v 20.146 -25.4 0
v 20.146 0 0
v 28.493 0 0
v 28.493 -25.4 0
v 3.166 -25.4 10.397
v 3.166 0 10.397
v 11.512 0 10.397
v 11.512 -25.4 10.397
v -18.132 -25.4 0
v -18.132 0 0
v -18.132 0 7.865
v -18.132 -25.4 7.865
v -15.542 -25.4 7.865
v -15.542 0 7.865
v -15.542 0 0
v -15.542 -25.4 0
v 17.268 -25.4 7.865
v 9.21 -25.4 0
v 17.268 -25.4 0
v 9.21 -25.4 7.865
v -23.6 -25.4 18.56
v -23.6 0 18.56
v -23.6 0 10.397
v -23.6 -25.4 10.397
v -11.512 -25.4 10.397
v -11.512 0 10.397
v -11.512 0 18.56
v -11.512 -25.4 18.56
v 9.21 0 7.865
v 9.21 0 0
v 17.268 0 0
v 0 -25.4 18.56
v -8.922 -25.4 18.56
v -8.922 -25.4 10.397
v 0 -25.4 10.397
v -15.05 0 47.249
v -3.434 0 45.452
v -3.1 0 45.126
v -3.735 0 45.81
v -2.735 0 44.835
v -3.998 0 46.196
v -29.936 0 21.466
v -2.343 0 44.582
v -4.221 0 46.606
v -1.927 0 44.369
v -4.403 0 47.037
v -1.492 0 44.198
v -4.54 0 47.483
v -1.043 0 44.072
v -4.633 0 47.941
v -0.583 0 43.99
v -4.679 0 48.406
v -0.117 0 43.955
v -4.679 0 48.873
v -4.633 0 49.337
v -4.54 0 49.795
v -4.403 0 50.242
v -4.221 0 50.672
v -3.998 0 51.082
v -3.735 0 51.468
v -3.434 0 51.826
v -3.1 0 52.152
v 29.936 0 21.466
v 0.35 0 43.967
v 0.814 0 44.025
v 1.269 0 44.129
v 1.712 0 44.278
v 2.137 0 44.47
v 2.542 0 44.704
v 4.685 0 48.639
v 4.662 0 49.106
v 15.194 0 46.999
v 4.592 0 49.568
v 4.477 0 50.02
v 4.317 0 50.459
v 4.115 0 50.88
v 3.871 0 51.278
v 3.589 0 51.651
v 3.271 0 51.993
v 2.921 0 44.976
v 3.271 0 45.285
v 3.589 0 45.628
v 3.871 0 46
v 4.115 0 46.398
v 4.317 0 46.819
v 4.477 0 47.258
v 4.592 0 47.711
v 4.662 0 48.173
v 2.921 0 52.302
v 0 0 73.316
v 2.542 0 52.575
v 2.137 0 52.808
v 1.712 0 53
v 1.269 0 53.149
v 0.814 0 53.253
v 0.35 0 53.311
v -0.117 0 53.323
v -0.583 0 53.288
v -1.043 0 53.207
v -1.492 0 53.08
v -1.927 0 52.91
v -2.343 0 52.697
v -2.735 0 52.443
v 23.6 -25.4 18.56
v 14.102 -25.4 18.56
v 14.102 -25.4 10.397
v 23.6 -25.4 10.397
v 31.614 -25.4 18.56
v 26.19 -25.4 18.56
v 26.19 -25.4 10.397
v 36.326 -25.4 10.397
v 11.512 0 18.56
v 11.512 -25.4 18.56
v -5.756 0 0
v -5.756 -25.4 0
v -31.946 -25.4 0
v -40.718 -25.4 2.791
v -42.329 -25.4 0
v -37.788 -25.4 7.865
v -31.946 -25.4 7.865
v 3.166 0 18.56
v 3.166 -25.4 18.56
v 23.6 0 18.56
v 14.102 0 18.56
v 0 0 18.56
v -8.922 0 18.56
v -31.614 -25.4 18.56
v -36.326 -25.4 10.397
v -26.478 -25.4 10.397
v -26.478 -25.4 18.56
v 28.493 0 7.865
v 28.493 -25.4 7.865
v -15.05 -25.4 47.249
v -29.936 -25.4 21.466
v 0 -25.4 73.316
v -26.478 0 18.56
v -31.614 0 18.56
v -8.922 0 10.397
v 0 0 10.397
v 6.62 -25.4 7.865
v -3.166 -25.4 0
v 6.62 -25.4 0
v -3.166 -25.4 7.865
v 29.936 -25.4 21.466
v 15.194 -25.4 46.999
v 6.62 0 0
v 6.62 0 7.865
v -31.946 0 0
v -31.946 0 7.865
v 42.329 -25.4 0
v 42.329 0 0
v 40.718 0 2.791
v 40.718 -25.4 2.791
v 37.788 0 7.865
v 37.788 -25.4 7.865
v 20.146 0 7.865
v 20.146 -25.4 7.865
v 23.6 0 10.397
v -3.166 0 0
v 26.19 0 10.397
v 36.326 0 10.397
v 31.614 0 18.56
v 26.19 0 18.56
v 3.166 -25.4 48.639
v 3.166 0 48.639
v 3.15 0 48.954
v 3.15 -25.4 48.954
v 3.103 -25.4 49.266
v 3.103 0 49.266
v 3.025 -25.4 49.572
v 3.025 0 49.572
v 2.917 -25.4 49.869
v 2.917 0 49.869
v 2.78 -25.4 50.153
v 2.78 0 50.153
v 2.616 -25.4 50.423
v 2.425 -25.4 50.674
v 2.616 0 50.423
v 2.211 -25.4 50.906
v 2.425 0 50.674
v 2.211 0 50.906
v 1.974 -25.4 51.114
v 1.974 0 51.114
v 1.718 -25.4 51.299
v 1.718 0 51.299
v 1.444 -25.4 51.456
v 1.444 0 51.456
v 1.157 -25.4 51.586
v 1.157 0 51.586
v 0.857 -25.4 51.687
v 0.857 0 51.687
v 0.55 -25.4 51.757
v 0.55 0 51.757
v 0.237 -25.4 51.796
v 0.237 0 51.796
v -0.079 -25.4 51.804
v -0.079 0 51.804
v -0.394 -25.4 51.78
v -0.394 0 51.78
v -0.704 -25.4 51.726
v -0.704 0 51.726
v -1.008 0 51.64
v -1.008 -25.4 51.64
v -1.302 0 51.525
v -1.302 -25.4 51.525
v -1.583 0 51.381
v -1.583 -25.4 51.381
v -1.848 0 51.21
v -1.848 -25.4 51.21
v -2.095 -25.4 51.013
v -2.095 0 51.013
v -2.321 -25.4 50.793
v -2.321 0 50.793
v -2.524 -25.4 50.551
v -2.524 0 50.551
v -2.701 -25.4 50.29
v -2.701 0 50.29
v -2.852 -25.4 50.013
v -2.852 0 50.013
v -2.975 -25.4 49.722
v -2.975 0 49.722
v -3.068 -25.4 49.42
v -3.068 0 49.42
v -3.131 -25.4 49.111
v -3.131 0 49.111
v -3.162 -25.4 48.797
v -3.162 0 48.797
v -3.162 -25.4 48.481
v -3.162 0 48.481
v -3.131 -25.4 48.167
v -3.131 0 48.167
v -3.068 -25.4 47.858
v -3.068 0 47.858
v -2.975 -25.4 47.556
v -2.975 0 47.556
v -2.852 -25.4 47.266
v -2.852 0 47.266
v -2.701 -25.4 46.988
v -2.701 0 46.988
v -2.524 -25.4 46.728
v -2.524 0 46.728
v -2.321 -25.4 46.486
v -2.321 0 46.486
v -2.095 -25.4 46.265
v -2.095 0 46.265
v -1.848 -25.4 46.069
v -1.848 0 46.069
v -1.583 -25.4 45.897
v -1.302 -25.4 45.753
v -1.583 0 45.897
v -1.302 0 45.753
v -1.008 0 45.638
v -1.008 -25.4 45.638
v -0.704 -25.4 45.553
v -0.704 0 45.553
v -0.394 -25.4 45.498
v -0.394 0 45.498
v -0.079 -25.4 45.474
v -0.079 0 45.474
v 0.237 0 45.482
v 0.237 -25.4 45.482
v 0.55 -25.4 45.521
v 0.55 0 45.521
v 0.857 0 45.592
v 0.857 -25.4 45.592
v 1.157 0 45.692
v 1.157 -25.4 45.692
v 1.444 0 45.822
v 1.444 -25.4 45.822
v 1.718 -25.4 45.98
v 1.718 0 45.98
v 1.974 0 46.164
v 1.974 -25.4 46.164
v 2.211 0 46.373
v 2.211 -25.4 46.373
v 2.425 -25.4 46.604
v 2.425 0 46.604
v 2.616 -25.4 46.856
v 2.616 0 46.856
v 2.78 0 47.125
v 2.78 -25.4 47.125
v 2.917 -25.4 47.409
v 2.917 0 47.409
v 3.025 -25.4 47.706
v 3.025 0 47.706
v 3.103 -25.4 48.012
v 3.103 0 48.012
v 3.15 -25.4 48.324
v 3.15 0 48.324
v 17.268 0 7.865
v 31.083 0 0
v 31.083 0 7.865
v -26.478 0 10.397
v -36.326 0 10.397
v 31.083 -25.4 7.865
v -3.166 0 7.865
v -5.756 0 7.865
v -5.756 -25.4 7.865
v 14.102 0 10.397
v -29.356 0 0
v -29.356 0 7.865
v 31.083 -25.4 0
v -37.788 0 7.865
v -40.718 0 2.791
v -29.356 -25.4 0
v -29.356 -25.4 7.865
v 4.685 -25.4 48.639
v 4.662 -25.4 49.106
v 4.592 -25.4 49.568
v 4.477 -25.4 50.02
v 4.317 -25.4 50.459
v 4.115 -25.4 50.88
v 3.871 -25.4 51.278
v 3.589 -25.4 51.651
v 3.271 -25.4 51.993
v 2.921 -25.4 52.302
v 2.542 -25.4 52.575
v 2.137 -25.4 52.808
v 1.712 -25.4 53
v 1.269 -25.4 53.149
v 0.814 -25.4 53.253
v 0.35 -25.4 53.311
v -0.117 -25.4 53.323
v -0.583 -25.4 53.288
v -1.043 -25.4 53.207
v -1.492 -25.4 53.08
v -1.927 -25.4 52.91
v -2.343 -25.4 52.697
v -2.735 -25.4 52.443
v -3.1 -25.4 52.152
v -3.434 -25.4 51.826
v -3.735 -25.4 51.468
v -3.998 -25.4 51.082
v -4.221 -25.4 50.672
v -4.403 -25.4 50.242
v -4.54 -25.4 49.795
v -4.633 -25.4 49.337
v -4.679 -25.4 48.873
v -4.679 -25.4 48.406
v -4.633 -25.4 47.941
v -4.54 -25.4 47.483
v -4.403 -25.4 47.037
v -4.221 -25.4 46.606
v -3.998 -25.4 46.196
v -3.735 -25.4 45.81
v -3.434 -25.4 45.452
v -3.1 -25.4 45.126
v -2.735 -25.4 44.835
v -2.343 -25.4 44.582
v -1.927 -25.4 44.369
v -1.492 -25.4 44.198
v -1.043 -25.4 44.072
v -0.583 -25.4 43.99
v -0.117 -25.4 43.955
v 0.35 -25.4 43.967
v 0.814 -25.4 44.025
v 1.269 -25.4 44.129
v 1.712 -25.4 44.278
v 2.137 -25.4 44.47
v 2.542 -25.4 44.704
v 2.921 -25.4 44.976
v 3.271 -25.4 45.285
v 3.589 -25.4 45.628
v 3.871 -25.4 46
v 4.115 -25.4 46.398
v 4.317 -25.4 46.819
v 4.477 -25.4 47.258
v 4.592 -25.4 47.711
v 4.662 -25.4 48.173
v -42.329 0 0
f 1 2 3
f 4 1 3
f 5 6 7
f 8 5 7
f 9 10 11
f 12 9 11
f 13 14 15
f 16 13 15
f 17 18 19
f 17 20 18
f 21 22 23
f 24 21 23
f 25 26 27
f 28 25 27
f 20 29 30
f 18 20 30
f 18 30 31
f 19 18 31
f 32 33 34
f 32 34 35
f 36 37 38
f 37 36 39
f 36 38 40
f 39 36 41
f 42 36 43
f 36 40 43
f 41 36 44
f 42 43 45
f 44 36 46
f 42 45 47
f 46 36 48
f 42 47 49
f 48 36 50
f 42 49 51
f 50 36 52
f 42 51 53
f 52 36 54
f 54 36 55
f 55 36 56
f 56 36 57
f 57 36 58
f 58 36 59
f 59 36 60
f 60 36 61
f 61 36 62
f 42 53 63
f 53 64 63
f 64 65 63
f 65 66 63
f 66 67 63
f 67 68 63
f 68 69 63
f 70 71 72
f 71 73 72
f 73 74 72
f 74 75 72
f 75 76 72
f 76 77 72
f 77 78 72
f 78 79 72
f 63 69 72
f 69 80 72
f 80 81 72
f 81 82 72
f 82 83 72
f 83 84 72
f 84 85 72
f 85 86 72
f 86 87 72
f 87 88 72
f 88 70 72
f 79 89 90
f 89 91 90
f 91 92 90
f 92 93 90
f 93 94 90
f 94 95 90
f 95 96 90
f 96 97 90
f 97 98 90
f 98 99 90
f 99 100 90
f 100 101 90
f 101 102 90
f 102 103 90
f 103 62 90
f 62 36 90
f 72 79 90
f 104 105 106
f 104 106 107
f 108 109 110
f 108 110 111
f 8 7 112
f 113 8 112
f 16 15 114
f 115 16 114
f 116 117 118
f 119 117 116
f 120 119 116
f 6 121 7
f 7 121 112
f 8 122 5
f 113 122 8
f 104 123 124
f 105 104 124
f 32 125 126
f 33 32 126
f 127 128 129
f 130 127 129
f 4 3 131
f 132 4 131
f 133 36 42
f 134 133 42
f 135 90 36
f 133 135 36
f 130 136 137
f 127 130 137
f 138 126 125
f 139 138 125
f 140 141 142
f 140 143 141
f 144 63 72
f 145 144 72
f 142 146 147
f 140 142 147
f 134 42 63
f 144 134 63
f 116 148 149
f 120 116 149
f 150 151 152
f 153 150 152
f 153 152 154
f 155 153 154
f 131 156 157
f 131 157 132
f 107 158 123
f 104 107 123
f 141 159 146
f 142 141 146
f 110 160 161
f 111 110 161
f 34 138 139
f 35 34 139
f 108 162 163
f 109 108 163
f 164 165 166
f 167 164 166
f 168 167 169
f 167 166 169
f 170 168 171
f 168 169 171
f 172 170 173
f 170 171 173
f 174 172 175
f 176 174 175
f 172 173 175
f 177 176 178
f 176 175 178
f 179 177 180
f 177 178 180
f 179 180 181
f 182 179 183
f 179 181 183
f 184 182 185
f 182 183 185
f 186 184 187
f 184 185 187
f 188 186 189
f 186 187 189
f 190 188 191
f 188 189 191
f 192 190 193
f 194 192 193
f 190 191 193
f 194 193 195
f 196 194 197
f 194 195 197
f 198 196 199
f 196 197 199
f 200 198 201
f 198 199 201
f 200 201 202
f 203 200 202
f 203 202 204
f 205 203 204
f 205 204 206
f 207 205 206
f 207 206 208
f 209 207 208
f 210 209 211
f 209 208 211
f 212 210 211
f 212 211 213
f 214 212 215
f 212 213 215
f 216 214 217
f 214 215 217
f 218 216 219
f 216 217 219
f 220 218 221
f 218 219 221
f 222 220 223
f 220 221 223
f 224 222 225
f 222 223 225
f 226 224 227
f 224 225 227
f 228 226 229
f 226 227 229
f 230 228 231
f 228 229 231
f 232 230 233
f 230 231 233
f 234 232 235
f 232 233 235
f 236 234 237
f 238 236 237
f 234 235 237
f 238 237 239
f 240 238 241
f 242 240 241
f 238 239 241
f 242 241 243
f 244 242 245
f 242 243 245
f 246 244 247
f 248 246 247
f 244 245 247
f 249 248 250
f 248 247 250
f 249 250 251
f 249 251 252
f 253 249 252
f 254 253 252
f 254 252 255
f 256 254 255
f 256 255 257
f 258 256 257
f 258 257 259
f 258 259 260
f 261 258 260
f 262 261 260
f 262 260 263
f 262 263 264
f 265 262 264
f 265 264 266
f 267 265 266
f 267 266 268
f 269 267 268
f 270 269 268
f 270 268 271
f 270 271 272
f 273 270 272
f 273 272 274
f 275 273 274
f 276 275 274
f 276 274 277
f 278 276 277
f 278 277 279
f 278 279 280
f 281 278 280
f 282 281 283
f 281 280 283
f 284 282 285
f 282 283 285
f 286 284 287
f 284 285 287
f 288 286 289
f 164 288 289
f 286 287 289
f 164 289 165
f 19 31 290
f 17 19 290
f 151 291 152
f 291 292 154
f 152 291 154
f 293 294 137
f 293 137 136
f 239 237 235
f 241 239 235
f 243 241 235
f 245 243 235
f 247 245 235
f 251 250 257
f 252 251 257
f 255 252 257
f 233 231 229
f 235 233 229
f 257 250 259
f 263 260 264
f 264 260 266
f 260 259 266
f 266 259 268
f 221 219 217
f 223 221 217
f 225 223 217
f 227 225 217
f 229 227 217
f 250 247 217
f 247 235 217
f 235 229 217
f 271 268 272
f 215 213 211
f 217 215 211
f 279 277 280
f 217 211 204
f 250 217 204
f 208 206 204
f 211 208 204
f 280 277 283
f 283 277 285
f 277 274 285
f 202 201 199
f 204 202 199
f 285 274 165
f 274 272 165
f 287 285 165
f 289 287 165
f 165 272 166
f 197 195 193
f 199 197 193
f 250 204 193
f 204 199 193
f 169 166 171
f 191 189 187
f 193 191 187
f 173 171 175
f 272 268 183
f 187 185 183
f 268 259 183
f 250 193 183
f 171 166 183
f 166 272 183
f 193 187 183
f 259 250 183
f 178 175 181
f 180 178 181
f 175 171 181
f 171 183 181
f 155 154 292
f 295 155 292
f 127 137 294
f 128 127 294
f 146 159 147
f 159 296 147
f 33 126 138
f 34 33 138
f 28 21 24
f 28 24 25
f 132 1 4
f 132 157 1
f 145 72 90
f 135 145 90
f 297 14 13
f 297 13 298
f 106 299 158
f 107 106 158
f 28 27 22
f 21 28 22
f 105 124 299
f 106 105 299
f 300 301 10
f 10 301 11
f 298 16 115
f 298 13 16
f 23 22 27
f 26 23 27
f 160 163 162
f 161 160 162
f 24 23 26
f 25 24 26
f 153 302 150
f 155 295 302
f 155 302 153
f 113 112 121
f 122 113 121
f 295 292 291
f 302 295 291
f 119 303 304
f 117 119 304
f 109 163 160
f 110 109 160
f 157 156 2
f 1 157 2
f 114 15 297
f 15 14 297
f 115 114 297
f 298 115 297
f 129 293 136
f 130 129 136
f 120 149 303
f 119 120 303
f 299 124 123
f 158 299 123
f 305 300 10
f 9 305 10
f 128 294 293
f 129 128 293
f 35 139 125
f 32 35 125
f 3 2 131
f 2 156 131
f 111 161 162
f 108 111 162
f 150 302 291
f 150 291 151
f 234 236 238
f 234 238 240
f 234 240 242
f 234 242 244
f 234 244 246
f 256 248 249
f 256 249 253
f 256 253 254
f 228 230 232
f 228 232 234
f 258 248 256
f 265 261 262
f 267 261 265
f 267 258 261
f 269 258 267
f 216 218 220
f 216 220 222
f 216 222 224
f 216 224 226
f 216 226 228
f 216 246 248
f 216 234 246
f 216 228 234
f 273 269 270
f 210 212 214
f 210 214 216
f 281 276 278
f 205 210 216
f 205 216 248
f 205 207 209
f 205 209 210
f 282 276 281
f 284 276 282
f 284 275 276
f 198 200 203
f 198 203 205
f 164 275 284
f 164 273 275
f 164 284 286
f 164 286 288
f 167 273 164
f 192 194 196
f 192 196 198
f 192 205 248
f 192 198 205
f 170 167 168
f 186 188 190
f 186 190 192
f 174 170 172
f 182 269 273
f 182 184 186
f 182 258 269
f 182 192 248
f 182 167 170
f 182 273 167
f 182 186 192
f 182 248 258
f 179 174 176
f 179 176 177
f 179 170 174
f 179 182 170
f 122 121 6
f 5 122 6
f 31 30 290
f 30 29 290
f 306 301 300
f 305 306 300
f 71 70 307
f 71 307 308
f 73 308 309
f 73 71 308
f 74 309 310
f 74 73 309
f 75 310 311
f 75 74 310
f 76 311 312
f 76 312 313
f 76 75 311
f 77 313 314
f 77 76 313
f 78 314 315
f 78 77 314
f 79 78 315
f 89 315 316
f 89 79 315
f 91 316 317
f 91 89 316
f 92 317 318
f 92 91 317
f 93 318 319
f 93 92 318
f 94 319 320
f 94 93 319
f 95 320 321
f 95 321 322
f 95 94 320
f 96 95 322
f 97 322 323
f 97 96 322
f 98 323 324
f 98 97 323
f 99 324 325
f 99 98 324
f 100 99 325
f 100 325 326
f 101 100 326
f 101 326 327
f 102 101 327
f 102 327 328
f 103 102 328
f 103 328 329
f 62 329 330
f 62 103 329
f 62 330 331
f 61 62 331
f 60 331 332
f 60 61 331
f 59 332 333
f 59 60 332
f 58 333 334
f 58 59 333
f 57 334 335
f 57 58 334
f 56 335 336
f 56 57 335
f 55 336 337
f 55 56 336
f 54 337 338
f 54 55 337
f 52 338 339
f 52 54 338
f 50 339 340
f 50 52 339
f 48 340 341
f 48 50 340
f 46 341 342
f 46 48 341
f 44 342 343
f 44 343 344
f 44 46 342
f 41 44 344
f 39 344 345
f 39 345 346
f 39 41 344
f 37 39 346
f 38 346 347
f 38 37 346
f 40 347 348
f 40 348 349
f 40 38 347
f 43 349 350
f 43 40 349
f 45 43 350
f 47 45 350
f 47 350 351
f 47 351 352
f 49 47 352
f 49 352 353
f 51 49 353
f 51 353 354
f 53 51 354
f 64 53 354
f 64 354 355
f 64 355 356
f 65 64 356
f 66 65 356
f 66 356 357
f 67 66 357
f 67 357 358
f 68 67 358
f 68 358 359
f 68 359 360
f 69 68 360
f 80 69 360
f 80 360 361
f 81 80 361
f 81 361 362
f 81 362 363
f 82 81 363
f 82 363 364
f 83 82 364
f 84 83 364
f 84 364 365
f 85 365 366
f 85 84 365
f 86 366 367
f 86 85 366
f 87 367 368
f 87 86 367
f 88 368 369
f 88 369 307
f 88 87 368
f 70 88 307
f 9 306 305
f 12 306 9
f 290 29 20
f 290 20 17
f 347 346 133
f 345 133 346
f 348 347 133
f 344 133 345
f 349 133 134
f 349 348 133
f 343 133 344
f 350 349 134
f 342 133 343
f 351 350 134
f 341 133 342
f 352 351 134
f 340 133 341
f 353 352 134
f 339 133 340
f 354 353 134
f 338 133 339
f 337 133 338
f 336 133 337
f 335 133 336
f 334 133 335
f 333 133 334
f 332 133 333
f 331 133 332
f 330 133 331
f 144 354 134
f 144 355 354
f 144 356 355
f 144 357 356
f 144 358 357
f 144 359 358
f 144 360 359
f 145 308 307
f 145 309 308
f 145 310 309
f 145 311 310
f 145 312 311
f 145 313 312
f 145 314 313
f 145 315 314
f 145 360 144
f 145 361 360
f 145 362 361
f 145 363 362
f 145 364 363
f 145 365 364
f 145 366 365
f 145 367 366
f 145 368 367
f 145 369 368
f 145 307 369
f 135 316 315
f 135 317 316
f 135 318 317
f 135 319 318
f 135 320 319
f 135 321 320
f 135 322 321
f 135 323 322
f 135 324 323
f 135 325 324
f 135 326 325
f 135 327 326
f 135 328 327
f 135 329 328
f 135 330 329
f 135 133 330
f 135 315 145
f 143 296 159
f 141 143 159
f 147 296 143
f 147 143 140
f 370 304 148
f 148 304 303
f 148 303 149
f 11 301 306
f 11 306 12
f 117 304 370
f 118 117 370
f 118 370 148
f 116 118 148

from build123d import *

# Parameters (mm, degrees)
F0_R     = 4.6851378816
F1_DEPTH = 25.4
F0_W     = 11.2244244665
F0_H     = 2.7910378677
F0_H_2   = 5.0737742207
F0_W_2   = 9.7853969783
F0_W_3   = 9.7853962798
F0_W_4   = 8.0585628748
F0_W_5   = 8.3463639021
F0_R_2   = 3.1658646185


with BuildPart() as f1:
    # F0 (on Front) → F1 (new body)
    with BuildSketch(Plane.XZ):
        with BuildLine():
            Line((15.1939415336, 46.9994731352), (0, 73.3161518387))
            Line((0, 73.3161518387), (-15.0500384588, 47.2487205721))
            add(Edge.make_bspline(
                [(15.1939415336, 46.9994731352), (0, 57.5611554086), (0, 57.5611554086), (-15.0500384588, 47.2487205721)],
                knots=[0, 0, 0, 0, 30.2450070271, 30.2450070271, 30.2450070271, 30.2450070271], degree=3))
        make_face()
        with BuildLine():
            add(Edge.make_bspline(
                [(-15.0500384588, 47.2487205721), (0.2878046944, 40.8684164286), (0.2878046944, 40.8684164286), (15.1939415336, 46.9994731352)],
                knots=[0, 0, 0, 0, 30.2450070271, 30.2450070271, 30.2450070271, 30.2450070271], degree=3))
            Line((-15.0500384588, 47.2487205721), (-29.9356807926, 21.4660317468))
            Line((-29.9356807926, 21.4660317468), (29.9356807926, 21.4660317468))
            Line((29.9356807926, 21.4660317468), (15.1939415336, 46.9994731352))
        make_face()
        with BuildLine():
            add(Edge.make_bspline(
                [(15.1939415336, 46.9994731352), (0, 57.5611554086), (0, 57.5611554086), (-15.0500384588, 47.2487205721)],
                knots=[0, 0, 0, 0, 30.2450070271, 30.2450070271, 30.2450070271, 30.2450070271], degree=3))
            add(Edge.make_bspline(
                [(-15.0500384588, 47.2487205721), (0.2878046944, 40.8684164286), (0.2878046944, 40.8684164286), (15.1939415336, 46.9994731352)],
                knots=[0, 0, 0, 0, 30.2450070271, 30.2450070271, 30.2450070271, 30.2450070271], degree=3))
        make_face()
        with Locations((0, 48.6391745508)):
            Circle(F0_R, mode=Mode.SUBTRACT)
    extrude(amount=F1_DEPTH)


with BuildPart() as f1b:
    # F0 (on Front) → F1, piece 2 (new body)
    with BuildSketch(Plane.XZ):
        Polygon((-31.946439296, 2.7910378677), (-40.7176935358, 2.7910378677), (-42.3291, 0), (-31.946439296, 0), align=None)
        Polygon((-31.946439296, 7.8648120884), (-37.7883486236, 7.8648120884), (-40.7176935358, 2.7910378677), (-31.946439296, 2.7910378677), align=None)
    extrude(amount=F1_DEPTH)


with BuildPart() as f1c:
    # F0 (on Front) → F1, piece 3 (new body)
    with BuildSketch(Plane.XZ):
        Polygon((42.3291, 0), (40.7176935358, 2.7910378677), (31.0830194503, 2.7910378677), (31.0830194503, 0), align=None)
        Polygon((40.7176935358, 2.7910378677), (37.7883486236, 7.8648120884), (31.0830194503, 7.8648120884), (31.0830194503, 2.7910378677), align=None)
    extrude(amount=F1_DEPTH)


with BuildPart() as f1d:
    # F0 (on Front) → F1, piece 4 (new body)
    with BuildSketch(Plane.XZ):
        with Locations((-23.7439749762, 1.3955189338)):
            Rectangle(F0_W, F0_H)
        with Locations((-23.7439749762, 5.327924978)):
            Rectangle(F0_W, F0_H_2)
    extrude(amount=F1_DEPTH)


with BuildPart() as f1e:
    # F0 (on Front) → F1, piece 5 (new body)
    with BuildSketch(Plane.XZ):
        with Locations((-10.6488130987, 1.3955189338)):
            Rectangle(F0_W_2, F0_H)
        with Locations((-10.6488130987, 5.327924978)):
            Rectangle(F0_W_2, F0_H_2)
    extrude(amount=F1_DEPTH)


with BuildPart() as f1f:
    # F0 (on Front) → F1, piece 6 (new body)
    with BuildSketch(Plane.XZ):
        with Locations((1.7268344527, 1.3955189338)):
            Rectangle(F0_W_3, F0_H)
        with Locations((1.7268344527, 5.327924978)):
            Rectangle(F0_W_3, F0_H_2)
    extrude(amount=F1_DEPTH)


with BuildPart() as f1g:
    # F0 (on Front) → F1, piece 7 (new body)
    with BuildSketch(Plane.XZ):
        with Locations((13.2390651852, 1.3955189338)):
            Rectangle(F0_W_4, F0_H)
        with Locations((13.2390651852, 5.327924978)):
            Rectangle(F0_W_4, F0_H_2)
    extrude(amount=F1_DEPTH)


with BuildPart() as f1h:
    # F0 (on Front) → F1, piece 8 (new body)
    with BuildSketch(Plane.XZ):
        with Locations((24.3195854127, 1.3955189338)):
            Rectangle(F0_W_5, F0_H)
        with Locations((24.3195854127, 5.327924978)):
            Rectangle(F0_W_5, F0_H_2)
    extrude(amount=F1_DEPTH)


with BuildPart() as f1i:
    # F0 (on Front) → F1, piece 9 (new body)
    with BuildSketch(Plane.XZ):
        Polygon((-26.4781303704, 18.5597488231), (-31.6136240209, 18.5597488231), (-36.3262589598, 10.3972256714), (-31.946439296, 10.3972256714), (-29.3561872095, 10.3972256714), (-26.4781303704, 10.3972256714), align=None)
    extrude(amount=F1_DEPTH)


with BuildPart() as f1j:
    # F0 (on Front) → F1, piece 10 (new body)
    with BuildSketch(Plane.XZ):
        Polygon((36.3262589598, 10.3972256714), (31.6136240209, 18.5597488231), (26.1903218925, 18.5597488231), (26.1903218925, 10.3972256714), (28.4927673638, 10.3972256714), (31.0830194503, 10.3972256714), align=None)
    extrude(amount=F1_DEPTH)


with BuildPart() as f1k:
    # F0 (on Front) → F1, piece 11 (new body)
    with BuildSketch(Plane.XZ):
        Polygon((-11.5122301504, 18.5597488231), (-23.6000716686, 18.5597488231), (-23.6000716686, 10.3972256714), (-18.131762743, 10.3972256714), (-15.5415115878, 10.3972256714), (-11.5122301504, 10.3972256714), align=None)
    extrude(amount=F1_DEPTH)


with BuildPart() as f1l:
    # F0 (on Front) → F1, piece 12 (new body)
    with BuildSketch(Plane.XZ):
        Polygon((0, 18.5597488231), (-8.9219789952, 18.5597488231), (-8.9219789952, 10.3972256714), (-5.7561146095, 10.3972256714), (-3.1658636872, 10.3972256714), (0, 10.3972256714), align=None)
    extrude(amount=F1_DEPTH)


with BuildPart() as f1m:
    # F0 (on Front) → F1, piece 13 (new body)
    with BuildSketch(Plane.XZ):
        Polygon((11.5122292191, 10.3972256714), (11.5122292191, 18.5597488231), (3.1658646185, 18.5597488231), (3.1658646185, 10.3972256714), (6.6195325926, 10.3972256714), (9.2097837478, 10.3972256714), align=None)
    extrude(amount=F1_DEPTH)


with BuildPart() as f1n:
    # F0 (on Front) → F1, piece 14 (new body)
    with BuildSketch(Plane.XZ):
        Polygon((23.6000716686, 10.3972256714), (23.6000716686, 18.5597488231), (14.1024803743, 18.5597488231), (14.1024803743, 10.3972256714), (17.2683466226, 10.3972256714), (20.1464034617, 10.3972256714), align=None)
    extrude(amount=F1_DEPTH)


with BuildPart() as f1o:
    # F0 (on Front) → F1, piece 15 (new body)
    with BuildSketch(Plane.XZ):
        with Locations((0, 48.6391745508)):
            Circle(F0_R_2)
    extrude(amount=F1_DEPTH)


solid = Compound([f1.part, f1b.part, f1c.part, f1d.part, f1e.part, f1f.part, f1g.part, f1h.part, f1i.part, f1j.part, f1k.part, f1l.part, f1m.part, f1n.part, f1o.part])
